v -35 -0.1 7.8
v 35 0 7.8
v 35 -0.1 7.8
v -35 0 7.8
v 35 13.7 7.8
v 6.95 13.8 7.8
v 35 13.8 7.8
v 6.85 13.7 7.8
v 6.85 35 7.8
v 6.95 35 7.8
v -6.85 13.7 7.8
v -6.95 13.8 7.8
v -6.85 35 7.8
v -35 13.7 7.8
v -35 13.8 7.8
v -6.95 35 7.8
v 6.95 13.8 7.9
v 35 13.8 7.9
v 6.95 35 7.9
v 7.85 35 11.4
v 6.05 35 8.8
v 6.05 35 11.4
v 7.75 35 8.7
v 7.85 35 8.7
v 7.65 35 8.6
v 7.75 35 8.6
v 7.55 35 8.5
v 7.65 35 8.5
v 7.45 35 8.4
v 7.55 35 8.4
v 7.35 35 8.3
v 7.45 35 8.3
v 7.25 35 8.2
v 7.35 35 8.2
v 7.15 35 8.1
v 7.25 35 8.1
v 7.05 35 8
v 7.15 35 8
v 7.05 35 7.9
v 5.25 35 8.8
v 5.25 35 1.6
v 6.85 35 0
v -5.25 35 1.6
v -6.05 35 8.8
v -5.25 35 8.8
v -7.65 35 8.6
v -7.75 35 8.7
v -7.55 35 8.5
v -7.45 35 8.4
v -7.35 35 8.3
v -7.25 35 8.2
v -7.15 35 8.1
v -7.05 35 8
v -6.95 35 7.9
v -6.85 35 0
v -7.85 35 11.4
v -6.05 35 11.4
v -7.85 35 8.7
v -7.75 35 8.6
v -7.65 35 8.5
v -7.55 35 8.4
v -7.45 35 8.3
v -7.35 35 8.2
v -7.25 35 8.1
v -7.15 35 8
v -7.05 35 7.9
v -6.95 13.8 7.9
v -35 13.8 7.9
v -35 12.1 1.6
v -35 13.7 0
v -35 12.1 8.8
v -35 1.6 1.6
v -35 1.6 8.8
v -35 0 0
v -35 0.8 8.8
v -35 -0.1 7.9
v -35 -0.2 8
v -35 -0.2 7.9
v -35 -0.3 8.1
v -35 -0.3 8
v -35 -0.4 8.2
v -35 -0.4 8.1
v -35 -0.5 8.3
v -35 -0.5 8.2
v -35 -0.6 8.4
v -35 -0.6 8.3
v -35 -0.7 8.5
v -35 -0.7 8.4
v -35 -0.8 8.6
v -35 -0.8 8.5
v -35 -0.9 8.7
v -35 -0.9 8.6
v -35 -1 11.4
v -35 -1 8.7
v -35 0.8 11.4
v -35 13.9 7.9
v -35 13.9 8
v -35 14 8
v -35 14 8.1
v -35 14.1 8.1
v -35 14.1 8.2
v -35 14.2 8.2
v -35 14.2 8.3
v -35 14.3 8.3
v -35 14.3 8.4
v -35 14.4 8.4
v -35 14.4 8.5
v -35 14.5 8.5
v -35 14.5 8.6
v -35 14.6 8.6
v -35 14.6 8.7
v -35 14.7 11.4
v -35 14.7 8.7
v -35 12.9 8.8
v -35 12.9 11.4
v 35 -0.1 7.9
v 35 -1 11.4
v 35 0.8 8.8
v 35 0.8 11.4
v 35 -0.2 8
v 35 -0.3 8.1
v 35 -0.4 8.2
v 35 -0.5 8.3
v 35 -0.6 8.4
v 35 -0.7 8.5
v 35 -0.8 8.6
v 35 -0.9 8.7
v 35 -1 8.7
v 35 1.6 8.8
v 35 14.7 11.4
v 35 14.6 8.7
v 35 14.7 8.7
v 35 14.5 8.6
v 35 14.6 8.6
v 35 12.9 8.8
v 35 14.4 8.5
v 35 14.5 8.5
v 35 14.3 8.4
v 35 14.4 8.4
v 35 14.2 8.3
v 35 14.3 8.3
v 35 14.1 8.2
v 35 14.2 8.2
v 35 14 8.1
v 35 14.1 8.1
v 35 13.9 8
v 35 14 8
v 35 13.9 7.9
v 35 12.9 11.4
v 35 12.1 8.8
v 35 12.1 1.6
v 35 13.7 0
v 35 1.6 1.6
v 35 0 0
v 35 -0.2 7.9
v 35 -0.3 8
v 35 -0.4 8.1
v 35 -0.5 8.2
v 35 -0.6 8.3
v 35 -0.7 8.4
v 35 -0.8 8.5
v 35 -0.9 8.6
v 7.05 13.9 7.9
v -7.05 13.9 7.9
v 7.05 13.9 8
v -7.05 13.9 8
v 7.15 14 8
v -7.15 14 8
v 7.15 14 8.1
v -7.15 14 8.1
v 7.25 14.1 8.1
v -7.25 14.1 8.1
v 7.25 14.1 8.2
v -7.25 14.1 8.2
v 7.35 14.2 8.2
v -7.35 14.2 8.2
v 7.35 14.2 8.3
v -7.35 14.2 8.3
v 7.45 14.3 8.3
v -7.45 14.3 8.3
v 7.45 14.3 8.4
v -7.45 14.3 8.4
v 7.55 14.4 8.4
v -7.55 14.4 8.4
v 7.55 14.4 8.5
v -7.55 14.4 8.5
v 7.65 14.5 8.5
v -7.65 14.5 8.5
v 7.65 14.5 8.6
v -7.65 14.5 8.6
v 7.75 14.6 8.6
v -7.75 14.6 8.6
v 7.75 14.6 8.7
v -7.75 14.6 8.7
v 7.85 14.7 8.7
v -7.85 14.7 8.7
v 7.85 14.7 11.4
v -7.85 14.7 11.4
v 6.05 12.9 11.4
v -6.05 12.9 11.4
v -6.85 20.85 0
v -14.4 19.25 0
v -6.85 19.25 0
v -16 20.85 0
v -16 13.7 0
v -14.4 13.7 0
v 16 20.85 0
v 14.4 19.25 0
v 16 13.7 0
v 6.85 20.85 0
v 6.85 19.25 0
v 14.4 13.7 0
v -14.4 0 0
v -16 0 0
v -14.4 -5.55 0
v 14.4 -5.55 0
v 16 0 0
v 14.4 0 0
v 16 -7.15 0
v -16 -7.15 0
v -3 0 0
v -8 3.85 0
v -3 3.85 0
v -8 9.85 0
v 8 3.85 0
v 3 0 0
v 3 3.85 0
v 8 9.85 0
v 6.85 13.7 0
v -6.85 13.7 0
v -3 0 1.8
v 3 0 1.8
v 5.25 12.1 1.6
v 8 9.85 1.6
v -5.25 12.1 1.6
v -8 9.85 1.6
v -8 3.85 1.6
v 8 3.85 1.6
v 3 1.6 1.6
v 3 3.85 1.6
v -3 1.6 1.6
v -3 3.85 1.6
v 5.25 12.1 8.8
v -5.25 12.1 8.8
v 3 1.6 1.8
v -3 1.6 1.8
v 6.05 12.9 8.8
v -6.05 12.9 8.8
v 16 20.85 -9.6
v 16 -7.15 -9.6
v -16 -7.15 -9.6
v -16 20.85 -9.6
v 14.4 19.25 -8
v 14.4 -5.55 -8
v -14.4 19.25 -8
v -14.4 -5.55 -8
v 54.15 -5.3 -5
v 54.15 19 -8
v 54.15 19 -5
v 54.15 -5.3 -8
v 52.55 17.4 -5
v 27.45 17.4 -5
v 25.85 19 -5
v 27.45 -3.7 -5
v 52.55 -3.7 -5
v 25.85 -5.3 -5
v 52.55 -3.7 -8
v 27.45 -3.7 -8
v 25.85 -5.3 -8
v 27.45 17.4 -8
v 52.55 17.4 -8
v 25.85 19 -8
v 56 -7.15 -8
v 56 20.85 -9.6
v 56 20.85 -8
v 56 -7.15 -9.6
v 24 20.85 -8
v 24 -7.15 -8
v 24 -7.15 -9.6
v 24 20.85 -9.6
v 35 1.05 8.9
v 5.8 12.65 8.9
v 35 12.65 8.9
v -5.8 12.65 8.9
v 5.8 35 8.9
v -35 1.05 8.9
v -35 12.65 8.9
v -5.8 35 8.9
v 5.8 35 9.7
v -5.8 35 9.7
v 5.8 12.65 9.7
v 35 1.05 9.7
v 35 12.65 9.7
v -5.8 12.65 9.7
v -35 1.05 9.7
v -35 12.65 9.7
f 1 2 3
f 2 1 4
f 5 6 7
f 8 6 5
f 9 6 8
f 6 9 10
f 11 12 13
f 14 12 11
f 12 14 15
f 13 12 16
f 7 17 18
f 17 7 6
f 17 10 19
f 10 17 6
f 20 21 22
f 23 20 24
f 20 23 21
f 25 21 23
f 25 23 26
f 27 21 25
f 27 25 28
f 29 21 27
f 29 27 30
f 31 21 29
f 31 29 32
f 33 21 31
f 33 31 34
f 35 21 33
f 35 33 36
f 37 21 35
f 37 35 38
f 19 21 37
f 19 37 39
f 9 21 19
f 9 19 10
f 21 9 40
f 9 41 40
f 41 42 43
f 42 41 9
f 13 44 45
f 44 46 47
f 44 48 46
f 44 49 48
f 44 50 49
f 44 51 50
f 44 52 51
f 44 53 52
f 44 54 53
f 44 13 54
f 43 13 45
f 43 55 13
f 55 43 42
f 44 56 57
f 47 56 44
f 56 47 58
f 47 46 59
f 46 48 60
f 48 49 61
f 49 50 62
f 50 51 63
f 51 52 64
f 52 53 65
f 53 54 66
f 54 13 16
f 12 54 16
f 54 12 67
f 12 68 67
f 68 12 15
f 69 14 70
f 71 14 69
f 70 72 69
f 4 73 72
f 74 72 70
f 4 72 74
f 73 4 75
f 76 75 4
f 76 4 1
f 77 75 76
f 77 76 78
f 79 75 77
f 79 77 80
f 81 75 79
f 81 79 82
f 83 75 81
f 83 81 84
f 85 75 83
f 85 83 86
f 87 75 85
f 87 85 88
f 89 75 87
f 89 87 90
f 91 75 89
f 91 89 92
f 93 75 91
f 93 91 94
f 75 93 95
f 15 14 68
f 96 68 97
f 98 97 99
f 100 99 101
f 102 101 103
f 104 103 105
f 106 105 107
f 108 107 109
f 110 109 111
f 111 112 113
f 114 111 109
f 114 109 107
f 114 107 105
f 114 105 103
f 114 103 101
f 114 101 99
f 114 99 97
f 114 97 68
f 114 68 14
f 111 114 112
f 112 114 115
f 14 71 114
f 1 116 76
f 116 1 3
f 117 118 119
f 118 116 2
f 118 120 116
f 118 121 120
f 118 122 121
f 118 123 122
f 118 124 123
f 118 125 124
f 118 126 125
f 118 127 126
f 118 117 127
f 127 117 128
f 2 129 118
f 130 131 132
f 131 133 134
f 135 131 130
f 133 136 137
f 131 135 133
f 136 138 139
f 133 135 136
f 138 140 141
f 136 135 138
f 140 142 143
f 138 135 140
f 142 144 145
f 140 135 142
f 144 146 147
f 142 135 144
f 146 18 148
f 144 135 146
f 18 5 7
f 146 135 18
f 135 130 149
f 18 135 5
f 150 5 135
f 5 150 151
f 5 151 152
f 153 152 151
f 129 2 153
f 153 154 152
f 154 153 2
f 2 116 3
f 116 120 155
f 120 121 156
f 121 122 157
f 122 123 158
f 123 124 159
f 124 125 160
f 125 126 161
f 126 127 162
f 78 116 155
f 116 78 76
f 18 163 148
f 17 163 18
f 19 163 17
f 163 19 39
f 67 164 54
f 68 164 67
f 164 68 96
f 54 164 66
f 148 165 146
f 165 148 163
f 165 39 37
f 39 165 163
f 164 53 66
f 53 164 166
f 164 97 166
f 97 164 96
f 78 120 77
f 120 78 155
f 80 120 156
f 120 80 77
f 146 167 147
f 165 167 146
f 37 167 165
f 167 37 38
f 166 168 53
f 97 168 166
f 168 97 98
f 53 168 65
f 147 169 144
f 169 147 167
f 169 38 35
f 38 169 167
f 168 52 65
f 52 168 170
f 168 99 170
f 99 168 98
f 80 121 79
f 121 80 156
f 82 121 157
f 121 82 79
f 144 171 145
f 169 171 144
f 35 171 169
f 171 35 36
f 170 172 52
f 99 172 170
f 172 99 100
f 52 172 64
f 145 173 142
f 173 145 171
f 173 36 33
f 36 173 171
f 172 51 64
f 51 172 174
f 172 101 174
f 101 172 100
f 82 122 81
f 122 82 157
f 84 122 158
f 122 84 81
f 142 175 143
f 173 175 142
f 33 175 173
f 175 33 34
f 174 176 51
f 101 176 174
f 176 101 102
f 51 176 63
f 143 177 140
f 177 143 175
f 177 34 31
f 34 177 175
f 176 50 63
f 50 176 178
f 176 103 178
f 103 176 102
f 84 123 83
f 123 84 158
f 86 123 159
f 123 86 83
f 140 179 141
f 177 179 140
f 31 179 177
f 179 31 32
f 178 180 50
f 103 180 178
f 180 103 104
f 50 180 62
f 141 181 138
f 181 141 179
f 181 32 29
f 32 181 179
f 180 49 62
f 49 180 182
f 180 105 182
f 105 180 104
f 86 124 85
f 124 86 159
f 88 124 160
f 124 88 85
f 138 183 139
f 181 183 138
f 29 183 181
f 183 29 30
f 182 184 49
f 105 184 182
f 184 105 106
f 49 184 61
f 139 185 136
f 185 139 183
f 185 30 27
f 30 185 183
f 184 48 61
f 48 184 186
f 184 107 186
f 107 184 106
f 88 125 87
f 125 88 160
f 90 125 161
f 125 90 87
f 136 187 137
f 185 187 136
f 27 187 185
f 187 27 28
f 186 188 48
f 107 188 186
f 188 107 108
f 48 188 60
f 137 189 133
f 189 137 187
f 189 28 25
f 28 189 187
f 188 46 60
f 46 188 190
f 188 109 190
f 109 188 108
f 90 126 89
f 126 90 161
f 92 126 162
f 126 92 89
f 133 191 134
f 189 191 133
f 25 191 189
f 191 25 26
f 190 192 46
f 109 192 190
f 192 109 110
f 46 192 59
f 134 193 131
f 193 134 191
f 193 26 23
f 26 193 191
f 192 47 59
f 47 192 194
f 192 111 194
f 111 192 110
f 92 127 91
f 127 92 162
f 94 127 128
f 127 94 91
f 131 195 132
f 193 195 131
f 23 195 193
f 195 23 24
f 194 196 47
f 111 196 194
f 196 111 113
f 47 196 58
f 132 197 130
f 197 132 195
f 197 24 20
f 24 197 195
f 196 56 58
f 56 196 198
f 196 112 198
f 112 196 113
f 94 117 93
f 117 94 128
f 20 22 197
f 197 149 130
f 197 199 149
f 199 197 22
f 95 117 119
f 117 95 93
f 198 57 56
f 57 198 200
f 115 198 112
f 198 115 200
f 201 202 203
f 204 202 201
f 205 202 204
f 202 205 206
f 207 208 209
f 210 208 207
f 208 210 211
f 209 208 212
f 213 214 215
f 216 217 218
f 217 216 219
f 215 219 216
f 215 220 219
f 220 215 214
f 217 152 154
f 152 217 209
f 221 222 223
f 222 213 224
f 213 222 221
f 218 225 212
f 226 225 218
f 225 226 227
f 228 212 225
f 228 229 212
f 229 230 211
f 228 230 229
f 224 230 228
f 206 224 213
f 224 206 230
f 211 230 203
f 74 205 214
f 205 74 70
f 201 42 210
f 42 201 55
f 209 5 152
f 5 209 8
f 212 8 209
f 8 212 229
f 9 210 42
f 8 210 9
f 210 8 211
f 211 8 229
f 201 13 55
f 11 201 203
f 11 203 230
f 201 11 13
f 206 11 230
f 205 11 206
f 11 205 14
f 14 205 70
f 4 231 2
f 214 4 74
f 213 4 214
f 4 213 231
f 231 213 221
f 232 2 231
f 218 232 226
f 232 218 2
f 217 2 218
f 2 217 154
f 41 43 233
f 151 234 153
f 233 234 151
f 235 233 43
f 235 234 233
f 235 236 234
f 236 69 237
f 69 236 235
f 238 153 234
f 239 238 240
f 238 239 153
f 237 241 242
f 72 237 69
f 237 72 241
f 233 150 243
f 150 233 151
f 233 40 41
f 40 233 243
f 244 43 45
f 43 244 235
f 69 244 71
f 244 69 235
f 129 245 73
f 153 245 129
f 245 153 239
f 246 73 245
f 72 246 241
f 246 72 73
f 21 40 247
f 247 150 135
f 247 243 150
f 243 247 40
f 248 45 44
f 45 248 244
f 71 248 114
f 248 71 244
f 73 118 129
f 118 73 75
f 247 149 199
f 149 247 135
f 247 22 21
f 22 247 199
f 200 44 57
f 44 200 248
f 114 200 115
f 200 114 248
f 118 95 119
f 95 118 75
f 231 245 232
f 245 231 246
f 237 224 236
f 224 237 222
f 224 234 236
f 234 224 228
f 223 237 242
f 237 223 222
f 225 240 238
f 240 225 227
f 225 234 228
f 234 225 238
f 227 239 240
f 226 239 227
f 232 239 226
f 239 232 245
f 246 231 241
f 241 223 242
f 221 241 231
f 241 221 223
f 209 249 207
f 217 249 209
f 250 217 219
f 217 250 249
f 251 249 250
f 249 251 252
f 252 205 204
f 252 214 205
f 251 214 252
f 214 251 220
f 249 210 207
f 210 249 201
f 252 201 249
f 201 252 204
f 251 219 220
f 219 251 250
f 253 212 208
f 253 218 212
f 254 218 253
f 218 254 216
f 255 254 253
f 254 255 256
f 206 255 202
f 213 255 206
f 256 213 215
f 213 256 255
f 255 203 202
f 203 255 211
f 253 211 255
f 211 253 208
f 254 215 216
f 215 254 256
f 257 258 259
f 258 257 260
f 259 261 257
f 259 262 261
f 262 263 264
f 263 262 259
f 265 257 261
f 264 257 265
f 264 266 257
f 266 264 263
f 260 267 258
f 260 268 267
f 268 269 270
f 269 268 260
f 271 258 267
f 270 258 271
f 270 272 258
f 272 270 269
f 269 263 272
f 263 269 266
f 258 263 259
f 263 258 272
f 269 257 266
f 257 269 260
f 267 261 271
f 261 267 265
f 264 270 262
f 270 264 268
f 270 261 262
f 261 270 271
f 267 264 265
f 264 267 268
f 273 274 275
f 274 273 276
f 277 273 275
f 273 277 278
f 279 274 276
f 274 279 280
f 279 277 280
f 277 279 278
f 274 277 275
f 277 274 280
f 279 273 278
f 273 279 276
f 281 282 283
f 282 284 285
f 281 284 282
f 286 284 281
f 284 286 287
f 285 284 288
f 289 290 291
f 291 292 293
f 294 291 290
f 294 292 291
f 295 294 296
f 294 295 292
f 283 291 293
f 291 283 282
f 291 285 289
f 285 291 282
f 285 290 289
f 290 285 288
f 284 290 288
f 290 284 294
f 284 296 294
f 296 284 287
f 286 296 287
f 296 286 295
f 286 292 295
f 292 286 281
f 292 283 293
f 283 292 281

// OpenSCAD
/* Modular LED channel accessories - Customizer ready */

/* [Output] */
part = "electrical_t_assembly"; // [rounded_corner_assembly,rounded_corner_body,rounded_corner_diffuser,square_corner_assembly,square_corner_body,square_corner_diffuser,t_connector_assembly,t_connector_body,t_connector_diffuser,electrical_t_assembly,electrical_t_body,electrical_t_diffuser,electrical_t_box,electrical_t_cover,end_cap,cable_end_cap,bridge_clip,mounting_clip]

/* [Shared Channel Profile] */
strip_width = 10; // [6:0.5:20]
strip_clearance = 0.5; // [0:0.1:2]
strip_thickness = 2.2; // [0.5:0.1:5]
wall = 1.6; // [0.8:0.1:4]
base = 1.6; // [0.8:0.1:4]
air_gap = 5; // [1:0.5:20]
diffuser_thickness = 0.8; // [0.4:0.1:2.5]
diffuser_overlap = 0.8; // [0.2:0.1:2]
// Clearance around the diffuser in its pocket
diffuser_clearance = 0.2; // [0:0.05:0.5]
// Total diffuser width reduction for a sliding fit (split evenly between both sides)
diffuser_width_clearance = 0.1; // [0:0.05:0.5]
// Material above the diffuser groove (straight channel only; end cap plate covers it)
top_lip = 0.8; // [0.4:0.1:2]
// Extra wall thickness added outward around the diffuser pocket (45 degree underside)
rim_extra = 1.0; // [0:0.1:3]
preview_gap = 0; // [0:0.5:10]

/* [Corner and Tee Dimensions] */
corner_centerline_radius = 25; // [12:1:100]
corner_arm_length = 25; // [5:1:100]
square_corner_arm_length = 30; // [15:1:100]
t_main_half_length = 35; // [15:1:100]
t_branch_length = 35; // [15:1:100]
corner_segments = 48; // [12:1:120]


/* [Electrical T Junction Box] */

// Box width along the main run
junction_box_length = 32; // [20:1:60]

// Box width across the main run
junction_box_width = 28; // [18:1:60]

// Internal box depth below the channel
junction_box_depth = 8; // [4:0.5:20]

// Junction-box wall thickness
junction_box_wall = 1.6; // [0.8:0.1:4]

// Clearance between the box and its cover
junction_cover_clearance = 0.25; // [0:0.05:0.8]

// Cover thickness
junction_cover_thickness = 1.6; // [0.8:0.1:4]

// Wire pass-through width in each channel branch
junction_wire_slot_width = 6; // [2:0.5:14]

// Wire pass-through length along each channel branch
junction_wire_slot_length = 8; // [3:0.5:20]

// Distance that the cover lip enters the box
junction_cover_lip_depth = 3; // [1:0.5:8]

// Optional screw hole through the cover
junction_cover_screw = false;

// Cover screw diameter
junction_cover_screw_diameter = 3; // [1.5:0.1:6]

/* [End Caps] */
end_cap_thickness = 2; // [1:0.2:5]
collar_depth = 5; // [2:0.5:12]
cap_clearance = 0.25; // [0:0.05:0.8]
cable_hole_diameter = 5; // [2:0.5:15]

/* [External Clips] */
clip_length = 20; // [8:1:60]
clip_wall = 1.6; // [0.8:0.1:4]
clip_clearance = 0.25; // [0:0.05:0.8]
clip_side_height = 5; // [2:0.5:12]
retention_lip = 0.6; // [0:0.1:1.5]
screw_diameter = 3.4; // [1.5:0.1:8]
screw_head_diameter = 6.5; // [3:0.1:15]

/* [Advanced] */
$fn = 64;

inside_width = strip_width + strip_clearance;
outside_width = inside_width + 2*wall;
inside_height = strip_thickness + air_gap;
groove_height = diffuser_thickness + diffuser_clearance;
groove_floor = base + inside_height;
// matches led_channel.scad so parts join flush: groove + 45 degree roof rise + top lip
body_height = groove_floor + groove_height + diffuser_overlap + top_lip;
// slice height used to build 45 degree slopes from 2D offsets
slope_step = 0.1;

assert(wall + rim_extra - diffuser_overlap >= 0.8, "wall behind the diffuser pocket is under 0.8 mm; raise rim_extra or lower diffuser_overlap");
assert(corner_centerline_radius > outside_width/2 + rim_extra, "corner radius is too small for the rim");
assert(square_corner_arm_length > outside_width, "square corner arms are too short");
assert(t_main_half_length > outside_width/2, "T main run is too short");
assert(t_branch_length > outside_width, "T branch is too short");
assert(junction_box_length > outside_width, "junction box length must exceed channel width");
assert(junction_box_width > outside_width, "junction box width must exceed channel width");
assert(junction_box_wall*2 < junction_box_length, "junction box walls are too thick");
assert(junction_box_wall*2 < junction_box_width, "junction box walls are too thick");
assert(junction_wire_slot_width < inside_width, "wire slot must fit inside the LED cavity");

function arc_points(r,a1,a2,n) =
    [for(i=[0:n]) [r*cos(a1+(a2-a1)*i/n), r*sin(a1+(a2-a1)*i/n)]];

module annular_sector_2d(r_inner,r_outer,a1=0,a2=90,n=48) {
    polygon(points=concat(
        arc_points(r_outer,a1,a2,n),
        [for(i=[n:-1:0]) arc_points(r_inner,a1,a2,n)[i]]
    ));
}

// Channel footprints. g grows (+) or insets (-) the outline on every side while the
// arm ends stay put; ext lengthens the arm ends so cuts run out through them.
module rounded_path_2d(g=0,ext=0) {
    w = outside_width + 2*g;
    r1 = corner_centerline_radius-w/2;
    r2 = corner_centerline_radius+w/2;

    union() {
        annular_sector_2d(r1,r2,0,90,corner_segments);
        translate([r1,-(corner_arm_length+ext)])
            square([w,corner_arm_length+ext+0.02]);
        translate([-(corner_arm_length+ext),r1])
            square([corner_arm_length+ext+0.02,w]);
    }
}

module square_corner_path_2d(g=0,ext=0) {
    w = outside_width + 2*g;
    union() {
        translate([-g,-g]) square([square_corner_arm_length+ext+g,w]);
        translate([-g,-g]) square([w,square_corner_arm_length+ext+g]);
    }
}

module t_path_2d(g=0,ext=0) {
    w = outside_width + 2*g;
    union() {
        translate([-t_main_half_length-ext,-g])
            square([2*(t_main_half_length+ext),w]);
        translate([-w/2,-g])
            square([w,t_branch_length+ext+g]);
    }
}

module selected_path_2d(kind,g=0,ext=0) {
    if (kind == "rounded")
        rounded_path_2d(g,ext);
    else if (kind == "square")
        square_corner_path_2d(g,ext);
    else
        t_path_2d(g,ext);
}

// Outward thickening around the pocket, 45 degree underside so it prints without support
module rim_solid(kind) {
    n = ceil(rim_extra/slope_step);
    dz = rim_extra/n;
    if (rim_extra > 0) {
        for (k=[0:n-1])
            translate([0,0,groove_floor-rim_extra+k*dz])
                linear_extrude(height=dz+0.01) selected_path_2d(kind,(k+1)*dz);
        translate([0,0,groove_floor])
            linear_extrude(height=body_height-groove_floor) selected_path_2d(kind,rim_extra);
    }
}

// Corners and tees cannot take a diffuser that slides in along a straight groove, so the
// pocket is open at the top and the diffuser drops in from above.
module diffuser_pocket(kind) {
    translate([0,0,groove_floor])
        linear_extrude(height=body_height-groove_floor+1)
            selected_path_2d(kind,-(wall-diffuser_overlap),1);
}

module open_channel_body(kind="rounded") {
    difference() {
        union() {
            linear_extrude(height=body_height)
                selected_path_2d(kind);
            rim_solid(kind);
        }

        translate([0,0,base])
            linear_extrude(height=body_height)
                selected_path_2d(kind,-wall,1);

        diffuser_pocket(kind);
    }
}

module path_diffuser(kind="rounded") {
    translate([0,0,groove_floor+diffuser_clearance/2+preview_gap])
        linear_extrude(height=diffuser_thickness)
            selected_path_2d(kind,-(wall-(diffuser_overlap-diffuser_clearance))-diffuser_width_clearance/2);
}

// Cross-section of the straight channel profile, extruded along +x.
module channel_profile_extrude(h) {
    e = rim_extra;
    rotate([90,0,90]) linear_extrude(height=h)
        polygon([
            [0,0],[outside_width,0],
            [outside_width,groove_floor-e],[outside_width+e,groove_floor],
            [outside_width+e,body_height],[-e,body_height],
            [-e,groove_floor],[0,groove_floor-e]
        ]);
}

module end_cap(cable=false) {
    collar_outer_w = outside_width + 2*(wall-cap_clearance);
    collar_inner_w = outside_width + 2*cap_clearance;
    // keep the sleeve below the rim chamfer
    collar_h = min(groove_floor-rim_extra,base+5);

    difference() {
        union() {
            // plate matches the channel profile, so it also closes the diffuser groove
            channel_profile_extrude(end_cap_thickness);

            translate([end_cap_thickness,-(wall-cap_clearance),0])
                difference() {
                    cube([collar_depth,collar_outer_w,collar_h]);
                    translate([-0.1,wall,base])
                        cube([collar_depth+0.2,collar_inner_w,collar_h+0.2]);
                }
        }

        if (cable)
            translate([-0.1,outside_width/2,base+strip_thickness/2])
                rotate([0,90,0])
                    cylinder(h=end_cap_thickness+0.3,d=cable_hole_diameter);
    }
}

module external_clip(with_screw=false) {
    assert(clip_wall+clip_side_height <= groove_floor-rim_extra, "clip sides would hit the rim chamfer; lower clip_side_height");
    inner_w = outside_width + 2*clip_clearance;
    outer_w = inner_w + 2*clip_wall;

    difference() {
        union() {
            cube([clip_length,outer_w,clip_wall]);
            translate([0,0,clip_wall])
                cube([clip_length,clip_wall,clip_side_height]);
            translate([0,outer_w-clip_wall,clip_wall])
                cube([clip_length,clip_wall,clip_side_height]);

            if (retention_lip > 0) {
                translate([0,clip_wall,clip_wall+clip_side_height-retention_lip])
                    cube([clip_length,retention_lip,retention_lip]);
                translate([0,outer_w-clip_wall-retention_lip,clip_wall+clip_side_height-retention_lip])
                    cube([clip_length,retention_lip,retention_lip]);
            }
        }

        translate([-0.1,clip_wall,clip_wall])
            cube([clip_length+0.2,inner_w,body_height+2]);

        if (with_screw) {
            translate([clip_length/2,outer_w/2,-0.1])
                cylinder(h=clip_wall+0.3,d=screw_diameter);
            translate([clip_length/2,outer_w/2,max(0,clip_wall-1.2)])
                cylinder(h=1.4,d1=screw_diameter,d2=screw_head_diameter);
        }
    }
}


module electrical_t_wire_slots() {
    slot_w = junction_wire_slot_width;
    slot_l = junction_wire_slot_length;

    // Left branch.
    translate([-slot_l, (outside_width-slot_w)/2, -0.2])
        cube([slot_l, slot_w, base+0.4]);

    // Right branch.
    translate([0, (outside_width-slot_w)/2, -0.2])
        cube([slot_l, slot_w, base+0.4]);

    // Perpendicular branch.
    translate([-slot_w/2, 0, -0.2])
        cube([slot_w, slot_l, base+0.4]);
}

module electrical_t_body() {
    difference() {
        open_channel_body("tee");
        electrical_t_wire_slots();
    }
}

module electrical_t_box() {
    outer_l = junction_box_length;
    outer_w = junction_box_width;
    outer_h = junction_box_depth + junction_box_wall;

    difference() {
        // Box is shown below the channel in assembly preview.
        translate([-outer_l/2, (outside_width-outer_w)/2, -outer_h])
            cube([outer_l, outer_w, outer_h]);

        translate([
            -outer_l/2 + junction_box_wall,
            (outside_width-outer_w)/2 + junction_box_wall,
            -junction_box_depth
        ])
            cube([
                outer_l - 2*junction_box_wall,
                outer_w - 2*junction_box_wall,
                junction_box_depth + 0.2
            ]);

        // Three openings align with the pass-through slots in the T body.
        translate([
            -junction_wire_slot_length,
            (outside_width-junction_wire_slot_width)/2,
            -junction_box_wall-0.2
        ])
            cube([
                2*junction_wire_slot_length,
                junction_wire_slot_width,
                junction_box_wall+0.4
            ]);

        translate([
            -junction_wire_slot_width/2,
            0,
            -junction_box_wall-0.2
        ])
            cube([
                junction_wire_slot_width,
                junction_wire_slot_length,
                junction_box_wall+0.4
            ]);
    }
}

module electrical_t_cover() {
    outer_l = junction_box_length;
    outer_w = junction_box_width;
    lip_l = outer_l - 2*(junction_box_wall + junction_cover_clearance);
    lip_w = outer_w - 2*(junction_box_wall + junction_cover_clearance);

    difference() {
        union() {
            cube([outer_l, outer_w, junction_cover_thickness]);

            translate([
                junction_box_wall + junction_cover_clearance,
                junction_box_wall + junction_cover_clearance,
                junction_cover_thickness
            ])
                difference() {
                    cube([lip_l, lip_w, junction_cover_lip_depth]);

                    translate([junction_box_wall, junction_box_wall, -0.1])
                        cube([
                            max(0.1, lip_l-2*junction_box_wall),
                            max(0.1, lip_w-2*junction_box_wall),
                            junction_cover_lip_depth+0.2
                        ]);
                }
        }

        if (junction_cover_screw)
            translate([outer_l/2, outer_w/2, -0.1])
                cylinder(
                    h=junction_cover_thickness+junction_cover_lip_depth+0.3,
                    d=junction_cover_screw_diameter
                );
    }
}

module electrical_t_assembly() {
    color("dimgray") electrical_t_body();
    color([1,1,1,0.55]) path_diffuser("tee");
    color("slategray") electrical_t_box();

    // Cover shown beside the assembly so its fit is visible.
    color("gray")
        translate([
            junction_box_length/2 + 8,
            (outside_width-junction_box_width)/2,
            -junction_box_depth-junction_box_wall
        ])
            electrical_t_cover();
}

module assembly(kind) {
    color("dimgray") open_channel_body(kind);
    color([1,1,1,0.55]) path_diffuser(kind);
}

if (part == "rounded_corner_body")
    open_channel_body("rounded");
else if (part == "rounded_corner_diffuser")
    path_diffuser("rounded");
else if (part == "rounded_corner_assembly")
    assembly("rounded");
else if (part == "square_corner_body")
    open_channel_body("square");
else if (part == "square_corner_diffuser")
    path_diffuser("square");
else if (part == "square_corner_assembly")
    assembly("square");
else if (part == "electrical_t_body")
    electrical_t_body();
else if (part == "electrical_t_diffuser")
    path_diffuser("tee");
else if (part == "electrical_t_box")
    electrical_t_box();
else if (part == "electrical_t_cover")
    electrical_t_cover();
else if (part == "electrical_t_assembly")
    electrical_t_assembly();
else if (part == "t_connector_body")
    open_channel_body("tee");
else if (part == "t_connector_diffuser")
    path_diffuser("tee");
else if (part == "t_connector_assembly")
    assembly("tee");
else if (part == "end_cap")
    end_cap(false);
else if (part == "cable_end_cap")
    end_cap(true);
else if (part == "bridge_clip")
    external_clip(false);
else if (part == "mounting_clip")
    external_clip(true);
